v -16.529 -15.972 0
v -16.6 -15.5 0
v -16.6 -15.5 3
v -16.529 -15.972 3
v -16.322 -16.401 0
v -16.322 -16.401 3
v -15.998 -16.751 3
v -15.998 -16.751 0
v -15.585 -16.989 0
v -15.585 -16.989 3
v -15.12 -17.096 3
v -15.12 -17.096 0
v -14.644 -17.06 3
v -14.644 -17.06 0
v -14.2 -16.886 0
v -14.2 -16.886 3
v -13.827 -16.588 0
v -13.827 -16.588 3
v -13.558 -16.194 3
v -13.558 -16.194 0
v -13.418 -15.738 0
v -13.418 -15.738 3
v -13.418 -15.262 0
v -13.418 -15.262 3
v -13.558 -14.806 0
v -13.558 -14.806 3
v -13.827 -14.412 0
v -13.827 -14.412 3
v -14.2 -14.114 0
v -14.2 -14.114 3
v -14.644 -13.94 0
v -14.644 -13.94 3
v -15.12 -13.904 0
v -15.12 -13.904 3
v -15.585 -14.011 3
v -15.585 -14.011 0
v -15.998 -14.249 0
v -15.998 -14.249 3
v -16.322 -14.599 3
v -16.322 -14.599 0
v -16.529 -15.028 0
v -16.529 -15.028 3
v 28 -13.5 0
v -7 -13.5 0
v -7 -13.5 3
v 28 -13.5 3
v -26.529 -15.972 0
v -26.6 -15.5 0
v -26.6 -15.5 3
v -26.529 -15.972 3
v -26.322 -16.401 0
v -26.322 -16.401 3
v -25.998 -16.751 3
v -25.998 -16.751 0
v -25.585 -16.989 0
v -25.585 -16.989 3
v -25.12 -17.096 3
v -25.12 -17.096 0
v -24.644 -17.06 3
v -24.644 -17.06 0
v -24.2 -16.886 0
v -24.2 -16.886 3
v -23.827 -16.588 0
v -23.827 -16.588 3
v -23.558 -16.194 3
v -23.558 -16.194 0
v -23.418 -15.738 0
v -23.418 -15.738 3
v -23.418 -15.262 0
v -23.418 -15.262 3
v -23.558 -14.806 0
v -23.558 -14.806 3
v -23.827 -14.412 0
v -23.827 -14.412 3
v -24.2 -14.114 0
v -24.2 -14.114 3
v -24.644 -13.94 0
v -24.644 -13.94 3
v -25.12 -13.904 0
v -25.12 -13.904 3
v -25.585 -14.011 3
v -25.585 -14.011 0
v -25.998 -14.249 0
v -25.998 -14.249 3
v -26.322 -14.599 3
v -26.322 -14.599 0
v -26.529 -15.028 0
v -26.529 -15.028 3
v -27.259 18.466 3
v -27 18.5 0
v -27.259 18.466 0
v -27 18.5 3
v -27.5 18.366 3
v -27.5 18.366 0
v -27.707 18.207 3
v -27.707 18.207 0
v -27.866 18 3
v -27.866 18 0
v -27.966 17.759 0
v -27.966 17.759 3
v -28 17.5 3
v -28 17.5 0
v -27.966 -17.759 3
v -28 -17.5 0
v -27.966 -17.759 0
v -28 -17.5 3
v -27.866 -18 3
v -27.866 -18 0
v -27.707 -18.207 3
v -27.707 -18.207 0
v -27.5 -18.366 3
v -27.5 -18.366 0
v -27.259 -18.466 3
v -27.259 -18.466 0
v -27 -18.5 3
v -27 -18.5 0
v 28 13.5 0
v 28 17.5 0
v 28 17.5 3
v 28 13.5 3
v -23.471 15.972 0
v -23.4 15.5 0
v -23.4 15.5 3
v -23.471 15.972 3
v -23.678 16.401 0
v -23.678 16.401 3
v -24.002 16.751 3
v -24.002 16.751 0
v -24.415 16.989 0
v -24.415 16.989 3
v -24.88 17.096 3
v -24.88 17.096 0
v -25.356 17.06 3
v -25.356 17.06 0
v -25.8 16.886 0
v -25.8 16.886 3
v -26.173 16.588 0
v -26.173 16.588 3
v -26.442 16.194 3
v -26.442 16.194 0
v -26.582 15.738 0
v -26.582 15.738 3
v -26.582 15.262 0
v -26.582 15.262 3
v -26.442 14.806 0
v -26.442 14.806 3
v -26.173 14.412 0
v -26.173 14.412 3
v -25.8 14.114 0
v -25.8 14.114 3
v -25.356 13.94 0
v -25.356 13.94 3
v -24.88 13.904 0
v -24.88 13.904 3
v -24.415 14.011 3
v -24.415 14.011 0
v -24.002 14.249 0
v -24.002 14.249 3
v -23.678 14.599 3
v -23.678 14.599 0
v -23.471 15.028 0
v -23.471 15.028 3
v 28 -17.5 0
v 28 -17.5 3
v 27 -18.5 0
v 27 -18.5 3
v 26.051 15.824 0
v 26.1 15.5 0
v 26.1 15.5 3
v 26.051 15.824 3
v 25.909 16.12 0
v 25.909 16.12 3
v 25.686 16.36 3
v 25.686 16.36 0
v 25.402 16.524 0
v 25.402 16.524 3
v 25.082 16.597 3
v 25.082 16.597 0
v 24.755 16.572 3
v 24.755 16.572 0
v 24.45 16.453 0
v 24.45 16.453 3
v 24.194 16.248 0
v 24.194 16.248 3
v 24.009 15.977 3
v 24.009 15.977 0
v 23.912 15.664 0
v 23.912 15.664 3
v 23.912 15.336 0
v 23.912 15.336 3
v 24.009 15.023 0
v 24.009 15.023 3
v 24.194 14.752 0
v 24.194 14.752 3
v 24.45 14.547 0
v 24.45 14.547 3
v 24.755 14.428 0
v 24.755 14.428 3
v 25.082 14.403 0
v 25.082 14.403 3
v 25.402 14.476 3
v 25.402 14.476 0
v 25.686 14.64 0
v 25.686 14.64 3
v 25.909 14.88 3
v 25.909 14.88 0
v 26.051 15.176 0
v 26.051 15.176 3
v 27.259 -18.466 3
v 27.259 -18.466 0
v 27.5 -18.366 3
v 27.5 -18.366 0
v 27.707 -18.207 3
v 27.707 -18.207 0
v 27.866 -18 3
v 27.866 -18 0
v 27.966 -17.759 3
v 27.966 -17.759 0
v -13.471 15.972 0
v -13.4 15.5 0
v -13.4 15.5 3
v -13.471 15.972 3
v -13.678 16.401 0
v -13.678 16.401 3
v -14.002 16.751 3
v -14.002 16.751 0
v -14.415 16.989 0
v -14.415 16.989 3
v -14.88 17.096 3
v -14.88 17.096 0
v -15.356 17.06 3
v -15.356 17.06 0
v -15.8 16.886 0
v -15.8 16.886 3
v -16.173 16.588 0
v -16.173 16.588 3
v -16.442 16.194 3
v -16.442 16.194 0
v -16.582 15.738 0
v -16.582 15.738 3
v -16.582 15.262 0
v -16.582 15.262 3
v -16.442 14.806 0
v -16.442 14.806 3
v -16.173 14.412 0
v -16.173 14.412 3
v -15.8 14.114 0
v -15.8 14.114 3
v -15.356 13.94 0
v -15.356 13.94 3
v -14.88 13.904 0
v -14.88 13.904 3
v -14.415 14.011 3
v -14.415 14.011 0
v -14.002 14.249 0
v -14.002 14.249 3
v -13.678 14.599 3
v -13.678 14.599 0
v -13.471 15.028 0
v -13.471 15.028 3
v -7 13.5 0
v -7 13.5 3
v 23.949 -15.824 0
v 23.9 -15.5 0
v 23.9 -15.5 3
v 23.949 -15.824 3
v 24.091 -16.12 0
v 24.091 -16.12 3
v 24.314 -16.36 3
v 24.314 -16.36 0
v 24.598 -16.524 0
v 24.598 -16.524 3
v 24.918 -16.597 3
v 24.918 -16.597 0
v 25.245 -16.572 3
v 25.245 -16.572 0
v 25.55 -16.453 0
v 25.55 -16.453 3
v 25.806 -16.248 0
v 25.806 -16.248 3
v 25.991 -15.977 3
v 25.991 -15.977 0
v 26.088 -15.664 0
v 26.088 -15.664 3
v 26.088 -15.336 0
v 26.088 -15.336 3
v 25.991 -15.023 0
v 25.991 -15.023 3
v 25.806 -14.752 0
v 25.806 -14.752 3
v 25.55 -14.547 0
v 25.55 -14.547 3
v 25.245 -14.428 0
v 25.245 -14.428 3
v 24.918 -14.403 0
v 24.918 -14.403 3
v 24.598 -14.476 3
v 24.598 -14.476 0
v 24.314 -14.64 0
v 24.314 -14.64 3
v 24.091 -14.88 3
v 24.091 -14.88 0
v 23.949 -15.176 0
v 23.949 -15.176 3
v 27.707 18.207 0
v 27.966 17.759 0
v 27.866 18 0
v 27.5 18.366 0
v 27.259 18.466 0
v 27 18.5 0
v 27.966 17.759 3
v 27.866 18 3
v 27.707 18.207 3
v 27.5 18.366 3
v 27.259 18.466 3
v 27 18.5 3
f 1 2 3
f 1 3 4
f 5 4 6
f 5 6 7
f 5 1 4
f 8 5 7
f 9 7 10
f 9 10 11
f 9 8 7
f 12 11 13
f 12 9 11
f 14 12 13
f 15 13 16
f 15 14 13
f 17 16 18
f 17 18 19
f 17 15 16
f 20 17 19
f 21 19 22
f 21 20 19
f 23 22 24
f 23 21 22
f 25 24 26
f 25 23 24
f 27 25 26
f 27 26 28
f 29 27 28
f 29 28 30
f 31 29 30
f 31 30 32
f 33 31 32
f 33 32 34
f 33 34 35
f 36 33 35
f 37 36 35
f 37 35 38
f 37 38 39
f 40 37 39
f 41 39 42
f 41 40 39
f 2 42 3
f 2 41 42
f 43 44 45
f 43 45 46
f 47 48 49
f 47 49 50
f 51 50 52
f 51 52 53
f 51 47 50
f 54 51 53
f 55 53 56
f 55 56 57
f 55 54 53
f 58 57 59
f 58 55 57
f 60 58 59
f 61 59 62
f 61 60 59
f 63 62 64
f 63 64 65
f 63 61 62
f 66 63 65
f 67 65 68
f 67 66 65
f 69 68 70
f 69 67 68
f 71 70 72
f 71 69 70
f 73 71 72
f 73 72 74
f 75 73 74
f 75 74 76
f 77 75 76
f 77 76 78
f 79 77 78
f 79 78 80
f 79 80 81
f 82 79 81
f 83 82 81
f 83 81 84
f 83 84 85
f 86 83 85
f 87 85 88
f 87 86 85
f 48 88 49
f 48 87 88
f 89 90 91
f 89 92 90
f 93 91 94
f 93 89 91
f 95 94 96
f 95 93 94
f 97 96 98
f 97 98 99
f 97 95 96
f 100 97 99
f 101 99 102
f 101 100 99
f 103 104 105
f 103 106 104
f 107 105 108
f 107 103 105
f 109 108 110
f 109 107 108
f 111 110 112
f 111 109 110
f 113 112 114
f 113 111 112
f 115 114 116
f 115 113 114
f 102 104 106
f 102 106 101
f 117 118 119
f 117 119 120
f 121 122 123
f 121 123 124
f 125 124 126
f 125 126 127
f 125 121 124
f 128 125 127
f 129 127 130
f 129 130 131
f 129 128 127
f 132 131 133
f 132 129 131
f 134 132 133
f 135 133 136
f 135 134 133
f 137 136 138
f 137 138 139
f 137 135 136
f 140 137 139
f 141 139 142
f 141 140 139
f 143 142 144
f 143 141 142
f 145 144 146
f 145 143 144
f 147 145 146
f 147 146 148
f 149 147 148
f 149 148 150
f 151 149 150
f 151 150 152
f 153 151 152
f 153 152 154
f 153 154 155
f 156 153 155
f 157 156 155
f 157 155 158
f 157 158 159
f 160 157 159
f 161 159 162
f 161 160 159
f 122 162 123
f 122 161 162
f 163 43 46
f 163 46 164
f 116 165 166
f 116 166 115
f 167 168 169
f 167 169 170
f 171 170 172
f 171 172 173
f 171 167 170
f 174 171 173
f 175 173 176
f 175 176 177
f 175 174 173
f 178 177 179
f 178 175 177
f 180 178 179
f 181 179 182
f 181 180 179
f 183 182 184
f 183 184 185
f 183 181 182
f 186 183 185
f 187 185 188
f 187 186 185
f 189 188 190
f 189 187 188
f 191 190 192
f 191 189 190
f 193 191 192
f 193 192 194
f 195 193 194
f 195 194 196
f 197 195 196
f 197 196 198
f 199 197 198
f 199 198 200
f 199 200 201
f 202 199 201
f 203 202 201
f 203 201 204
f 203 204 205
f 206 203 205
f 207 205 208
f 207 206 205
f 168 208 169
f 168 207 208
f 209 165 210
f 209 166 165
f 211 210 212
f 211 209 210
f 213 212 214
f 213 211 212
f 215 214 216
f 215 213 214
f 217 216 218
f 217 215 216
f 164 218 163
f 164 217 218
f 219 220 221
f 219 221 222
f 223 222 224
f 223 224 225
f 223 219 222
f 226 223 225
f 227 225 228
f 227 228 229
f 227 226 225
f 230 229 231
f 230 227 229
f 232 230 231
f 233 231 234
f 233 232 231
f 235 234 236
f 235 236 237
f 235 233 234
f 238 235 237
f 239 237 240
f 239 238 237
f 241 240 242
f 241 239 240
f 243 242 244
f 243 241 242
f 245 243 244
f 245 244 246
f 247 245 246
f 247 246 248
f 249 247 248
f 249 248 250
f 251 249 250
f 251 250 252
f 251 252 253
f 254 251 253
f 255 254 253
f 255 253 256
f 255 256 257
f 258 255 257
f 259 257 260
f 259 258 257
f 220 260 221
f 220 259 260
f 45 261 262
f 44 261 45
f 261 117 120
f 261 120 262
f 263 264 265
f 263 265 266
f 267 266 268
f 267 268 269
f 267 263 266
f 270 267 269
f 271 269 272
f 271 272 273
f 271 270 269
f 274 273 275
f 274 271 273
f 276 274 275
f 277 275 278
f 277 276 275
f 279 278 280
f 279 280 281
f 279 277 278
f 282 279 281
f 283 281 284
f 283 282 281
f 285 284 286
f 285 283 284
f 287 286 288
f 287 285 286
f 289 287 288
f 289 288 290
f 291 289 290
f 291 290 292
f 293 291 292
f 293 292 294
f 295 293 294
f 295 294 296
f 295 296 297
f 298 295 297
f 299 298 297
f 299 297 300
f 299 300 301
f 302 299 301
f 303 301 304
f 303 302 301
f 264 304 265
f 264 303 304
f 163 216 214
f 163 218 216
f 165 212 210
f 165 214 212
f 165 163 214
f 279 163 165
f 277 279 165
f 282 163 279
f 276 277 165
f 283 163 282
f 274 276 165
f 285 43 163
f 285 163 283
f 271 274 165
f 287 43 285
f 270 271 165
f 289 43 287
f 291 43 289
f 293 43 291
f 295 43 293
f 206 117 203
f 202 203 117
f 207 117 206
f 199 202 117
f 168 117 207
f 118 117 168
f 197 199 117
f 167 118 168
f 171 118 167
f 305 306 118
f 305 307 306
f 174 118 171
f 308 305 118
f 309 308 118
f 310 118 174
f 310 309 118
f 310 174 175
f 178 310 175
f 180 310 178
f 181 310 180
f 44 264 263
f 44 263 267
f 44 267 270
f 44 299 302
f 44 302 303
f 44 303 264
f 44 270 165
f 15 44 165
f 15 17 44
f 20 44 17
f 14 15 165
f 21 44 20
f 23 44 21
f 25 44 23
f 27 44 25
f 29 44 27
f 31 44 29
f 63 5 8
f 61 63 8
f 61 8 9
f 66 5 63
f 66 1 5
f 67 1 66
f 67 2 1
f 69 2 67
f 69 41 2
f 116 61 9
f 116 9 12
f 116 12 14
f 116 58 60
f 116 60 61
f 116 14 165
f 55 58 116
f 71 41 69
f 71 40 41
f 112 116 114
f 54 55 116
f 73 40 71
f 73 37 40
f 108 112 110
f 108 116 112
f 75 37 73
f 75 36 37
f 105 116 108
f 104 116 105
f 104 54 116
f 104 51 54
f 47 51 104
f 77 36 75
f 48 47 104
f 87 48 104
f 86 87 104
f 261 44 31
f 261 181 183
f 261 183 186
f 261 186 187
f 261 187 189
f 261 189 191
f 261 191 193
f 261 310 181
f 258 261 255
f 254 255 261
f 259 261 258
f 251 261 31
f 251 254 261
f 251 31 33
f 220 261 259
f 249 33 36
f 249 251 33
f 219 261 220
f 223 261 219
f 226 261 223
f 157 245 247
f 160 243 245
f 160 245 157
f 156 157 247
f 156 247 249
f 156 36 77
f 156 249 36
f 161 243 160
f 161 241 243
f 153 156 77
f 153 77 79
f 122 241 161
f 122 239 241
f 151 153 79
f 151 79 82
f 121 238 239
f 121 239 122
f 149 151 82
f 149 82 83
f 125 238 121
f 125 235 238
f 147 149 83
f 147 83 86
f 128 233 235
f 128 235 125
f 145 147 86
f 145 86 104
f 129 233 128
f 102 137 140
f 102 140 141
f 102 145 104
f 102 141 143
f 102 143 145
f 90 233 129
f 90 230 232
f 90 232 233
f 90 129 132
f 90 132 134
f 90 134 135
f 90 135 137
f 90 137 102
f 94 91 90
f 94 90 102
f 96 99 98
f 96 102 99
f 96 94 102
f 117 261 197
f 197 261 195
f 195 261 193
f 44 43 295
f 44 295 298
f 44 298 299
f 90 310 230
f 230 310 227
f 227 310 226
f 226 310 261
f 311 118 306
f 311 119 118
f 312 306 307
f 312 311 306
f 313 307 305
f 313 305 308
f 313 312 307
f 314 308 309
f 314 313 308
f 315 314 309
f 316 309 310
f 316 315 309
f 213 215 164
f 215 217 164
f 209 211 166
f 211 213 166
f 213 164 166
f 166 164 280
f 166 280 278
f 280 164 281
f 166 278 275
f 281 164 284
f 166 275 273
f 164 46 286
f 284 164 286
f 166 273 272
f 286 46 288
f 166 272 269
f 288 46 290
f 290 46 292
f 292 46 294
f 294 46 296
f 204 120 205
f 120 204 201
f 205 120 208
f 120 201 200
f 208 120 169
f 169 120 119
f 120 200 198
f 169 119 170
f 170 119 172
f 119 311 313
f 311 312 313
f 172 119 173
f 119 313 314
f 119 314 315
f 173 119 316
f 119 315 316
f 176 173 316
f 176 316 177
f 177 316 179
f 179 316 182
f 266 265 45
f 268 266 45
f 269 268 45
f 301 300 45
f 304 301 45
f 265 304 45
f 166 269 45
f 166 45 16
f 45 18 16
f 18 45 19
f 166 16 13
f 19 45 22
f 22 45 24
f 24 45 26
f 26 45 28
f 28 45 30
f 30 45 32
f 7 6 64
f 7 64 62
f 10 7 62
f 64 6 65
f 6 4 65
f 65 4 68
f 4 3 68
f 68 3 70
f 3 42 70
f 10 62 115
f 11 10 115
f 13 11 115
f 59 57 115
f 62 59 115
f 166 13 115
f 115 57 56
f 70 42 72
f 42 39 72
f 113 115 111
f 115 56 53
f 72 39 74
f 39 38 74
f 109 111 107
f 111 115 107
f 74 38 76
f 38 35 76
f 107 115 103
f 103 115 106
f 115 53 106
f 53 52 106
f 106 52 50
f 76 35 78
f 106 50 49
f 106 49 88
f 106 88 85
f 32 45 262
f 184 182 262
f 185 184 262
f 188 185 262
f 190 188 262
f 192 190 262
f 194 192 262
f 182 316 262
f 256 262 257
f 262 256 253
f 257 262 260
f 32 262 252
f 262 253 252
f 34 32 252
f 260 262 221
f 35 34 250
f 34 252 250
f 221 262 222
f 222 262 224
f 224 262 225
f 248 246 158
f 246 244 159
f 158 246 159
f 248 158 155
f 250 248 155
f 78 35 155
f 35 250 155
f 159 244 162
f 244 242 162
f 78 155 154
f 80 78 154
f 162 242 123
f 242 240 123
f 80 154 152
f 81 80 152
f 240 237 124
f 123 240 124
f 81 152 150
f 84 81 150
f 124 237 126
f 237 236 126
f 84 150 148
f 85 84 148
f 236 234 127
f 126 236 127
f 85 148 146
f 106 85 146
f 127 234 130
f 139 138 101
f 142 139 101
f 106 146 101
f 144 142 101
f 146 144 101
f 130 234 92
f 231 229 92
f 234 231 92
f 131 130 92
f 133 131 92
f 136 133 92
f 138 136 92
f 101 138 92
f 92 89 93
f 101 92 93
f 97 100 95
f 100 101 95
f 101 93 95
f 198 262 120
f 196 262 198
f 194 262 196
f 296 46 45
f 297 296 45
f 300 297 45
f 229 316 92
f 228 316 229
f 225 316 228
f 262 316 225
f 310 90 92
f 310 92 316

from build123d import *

# Parameters (mm, degrees)
SKETCH_2_R      = 1.1
SKETCH_2_R_2    = 1.6
EXTRUDE_1_DEPTH = 3
FILLET_1_R      = 1


with BuildPart() as part:
    # 草图2 → 凸台-拉伸1 (new body)
    with BuildSketch(Plane.XY):
        Polygon((28, 18.5), (28, 13.5), (-7, 13.5), (-7, -13.5), (28, -13.5), (28, -18.5), (-28, -18.5), (-28, 18.5), align=None)
        with Locations((25, 15.5)):
            Circle(SKETCH_2_R, mode=Mode.SUBTRACT)
        with Locations(Location((25, -15.5, 0), (0, 0, 180))):
            Circle(SKETCH_2_R, mode=Mode.SUBTRACT)
        with Locations((-25, 15.5)):
            Circle(SKETCH_2_R_2, mode=Mode.SUBTRACT)
        with Locations((-15, 15.5)):
            Circle(SKETCH_2_R_2, mode=Mode.SUBTRACT)
        with Locations(Location((-15, -15.5, 0), (0, 0, 180))):
            Circle(SKETCH_2_R_2, mode=Mode.SUBTRACT)
        with Locations(Location((-25, -15.5, 0), (0, 0, 180))):
            Circle(SKETCH_2_R_2, mode=Mode.SUBTRACT)
    extrude(amount=EXTRUDE_1_DEPTH)

    # 圆角1
    fillet_1_edges = [part.edges().sort_by_distance(p)[0] for p in [
        (28, 18.5, 1.5),
        (28, -18.5, 1.5),
        (-28, -18.5, 1.5),
        (-28, 18.5, 1.5),
    ]]
    fillet(fillet_1_edges, radius=FILLET_1_R)


solid = part.part
